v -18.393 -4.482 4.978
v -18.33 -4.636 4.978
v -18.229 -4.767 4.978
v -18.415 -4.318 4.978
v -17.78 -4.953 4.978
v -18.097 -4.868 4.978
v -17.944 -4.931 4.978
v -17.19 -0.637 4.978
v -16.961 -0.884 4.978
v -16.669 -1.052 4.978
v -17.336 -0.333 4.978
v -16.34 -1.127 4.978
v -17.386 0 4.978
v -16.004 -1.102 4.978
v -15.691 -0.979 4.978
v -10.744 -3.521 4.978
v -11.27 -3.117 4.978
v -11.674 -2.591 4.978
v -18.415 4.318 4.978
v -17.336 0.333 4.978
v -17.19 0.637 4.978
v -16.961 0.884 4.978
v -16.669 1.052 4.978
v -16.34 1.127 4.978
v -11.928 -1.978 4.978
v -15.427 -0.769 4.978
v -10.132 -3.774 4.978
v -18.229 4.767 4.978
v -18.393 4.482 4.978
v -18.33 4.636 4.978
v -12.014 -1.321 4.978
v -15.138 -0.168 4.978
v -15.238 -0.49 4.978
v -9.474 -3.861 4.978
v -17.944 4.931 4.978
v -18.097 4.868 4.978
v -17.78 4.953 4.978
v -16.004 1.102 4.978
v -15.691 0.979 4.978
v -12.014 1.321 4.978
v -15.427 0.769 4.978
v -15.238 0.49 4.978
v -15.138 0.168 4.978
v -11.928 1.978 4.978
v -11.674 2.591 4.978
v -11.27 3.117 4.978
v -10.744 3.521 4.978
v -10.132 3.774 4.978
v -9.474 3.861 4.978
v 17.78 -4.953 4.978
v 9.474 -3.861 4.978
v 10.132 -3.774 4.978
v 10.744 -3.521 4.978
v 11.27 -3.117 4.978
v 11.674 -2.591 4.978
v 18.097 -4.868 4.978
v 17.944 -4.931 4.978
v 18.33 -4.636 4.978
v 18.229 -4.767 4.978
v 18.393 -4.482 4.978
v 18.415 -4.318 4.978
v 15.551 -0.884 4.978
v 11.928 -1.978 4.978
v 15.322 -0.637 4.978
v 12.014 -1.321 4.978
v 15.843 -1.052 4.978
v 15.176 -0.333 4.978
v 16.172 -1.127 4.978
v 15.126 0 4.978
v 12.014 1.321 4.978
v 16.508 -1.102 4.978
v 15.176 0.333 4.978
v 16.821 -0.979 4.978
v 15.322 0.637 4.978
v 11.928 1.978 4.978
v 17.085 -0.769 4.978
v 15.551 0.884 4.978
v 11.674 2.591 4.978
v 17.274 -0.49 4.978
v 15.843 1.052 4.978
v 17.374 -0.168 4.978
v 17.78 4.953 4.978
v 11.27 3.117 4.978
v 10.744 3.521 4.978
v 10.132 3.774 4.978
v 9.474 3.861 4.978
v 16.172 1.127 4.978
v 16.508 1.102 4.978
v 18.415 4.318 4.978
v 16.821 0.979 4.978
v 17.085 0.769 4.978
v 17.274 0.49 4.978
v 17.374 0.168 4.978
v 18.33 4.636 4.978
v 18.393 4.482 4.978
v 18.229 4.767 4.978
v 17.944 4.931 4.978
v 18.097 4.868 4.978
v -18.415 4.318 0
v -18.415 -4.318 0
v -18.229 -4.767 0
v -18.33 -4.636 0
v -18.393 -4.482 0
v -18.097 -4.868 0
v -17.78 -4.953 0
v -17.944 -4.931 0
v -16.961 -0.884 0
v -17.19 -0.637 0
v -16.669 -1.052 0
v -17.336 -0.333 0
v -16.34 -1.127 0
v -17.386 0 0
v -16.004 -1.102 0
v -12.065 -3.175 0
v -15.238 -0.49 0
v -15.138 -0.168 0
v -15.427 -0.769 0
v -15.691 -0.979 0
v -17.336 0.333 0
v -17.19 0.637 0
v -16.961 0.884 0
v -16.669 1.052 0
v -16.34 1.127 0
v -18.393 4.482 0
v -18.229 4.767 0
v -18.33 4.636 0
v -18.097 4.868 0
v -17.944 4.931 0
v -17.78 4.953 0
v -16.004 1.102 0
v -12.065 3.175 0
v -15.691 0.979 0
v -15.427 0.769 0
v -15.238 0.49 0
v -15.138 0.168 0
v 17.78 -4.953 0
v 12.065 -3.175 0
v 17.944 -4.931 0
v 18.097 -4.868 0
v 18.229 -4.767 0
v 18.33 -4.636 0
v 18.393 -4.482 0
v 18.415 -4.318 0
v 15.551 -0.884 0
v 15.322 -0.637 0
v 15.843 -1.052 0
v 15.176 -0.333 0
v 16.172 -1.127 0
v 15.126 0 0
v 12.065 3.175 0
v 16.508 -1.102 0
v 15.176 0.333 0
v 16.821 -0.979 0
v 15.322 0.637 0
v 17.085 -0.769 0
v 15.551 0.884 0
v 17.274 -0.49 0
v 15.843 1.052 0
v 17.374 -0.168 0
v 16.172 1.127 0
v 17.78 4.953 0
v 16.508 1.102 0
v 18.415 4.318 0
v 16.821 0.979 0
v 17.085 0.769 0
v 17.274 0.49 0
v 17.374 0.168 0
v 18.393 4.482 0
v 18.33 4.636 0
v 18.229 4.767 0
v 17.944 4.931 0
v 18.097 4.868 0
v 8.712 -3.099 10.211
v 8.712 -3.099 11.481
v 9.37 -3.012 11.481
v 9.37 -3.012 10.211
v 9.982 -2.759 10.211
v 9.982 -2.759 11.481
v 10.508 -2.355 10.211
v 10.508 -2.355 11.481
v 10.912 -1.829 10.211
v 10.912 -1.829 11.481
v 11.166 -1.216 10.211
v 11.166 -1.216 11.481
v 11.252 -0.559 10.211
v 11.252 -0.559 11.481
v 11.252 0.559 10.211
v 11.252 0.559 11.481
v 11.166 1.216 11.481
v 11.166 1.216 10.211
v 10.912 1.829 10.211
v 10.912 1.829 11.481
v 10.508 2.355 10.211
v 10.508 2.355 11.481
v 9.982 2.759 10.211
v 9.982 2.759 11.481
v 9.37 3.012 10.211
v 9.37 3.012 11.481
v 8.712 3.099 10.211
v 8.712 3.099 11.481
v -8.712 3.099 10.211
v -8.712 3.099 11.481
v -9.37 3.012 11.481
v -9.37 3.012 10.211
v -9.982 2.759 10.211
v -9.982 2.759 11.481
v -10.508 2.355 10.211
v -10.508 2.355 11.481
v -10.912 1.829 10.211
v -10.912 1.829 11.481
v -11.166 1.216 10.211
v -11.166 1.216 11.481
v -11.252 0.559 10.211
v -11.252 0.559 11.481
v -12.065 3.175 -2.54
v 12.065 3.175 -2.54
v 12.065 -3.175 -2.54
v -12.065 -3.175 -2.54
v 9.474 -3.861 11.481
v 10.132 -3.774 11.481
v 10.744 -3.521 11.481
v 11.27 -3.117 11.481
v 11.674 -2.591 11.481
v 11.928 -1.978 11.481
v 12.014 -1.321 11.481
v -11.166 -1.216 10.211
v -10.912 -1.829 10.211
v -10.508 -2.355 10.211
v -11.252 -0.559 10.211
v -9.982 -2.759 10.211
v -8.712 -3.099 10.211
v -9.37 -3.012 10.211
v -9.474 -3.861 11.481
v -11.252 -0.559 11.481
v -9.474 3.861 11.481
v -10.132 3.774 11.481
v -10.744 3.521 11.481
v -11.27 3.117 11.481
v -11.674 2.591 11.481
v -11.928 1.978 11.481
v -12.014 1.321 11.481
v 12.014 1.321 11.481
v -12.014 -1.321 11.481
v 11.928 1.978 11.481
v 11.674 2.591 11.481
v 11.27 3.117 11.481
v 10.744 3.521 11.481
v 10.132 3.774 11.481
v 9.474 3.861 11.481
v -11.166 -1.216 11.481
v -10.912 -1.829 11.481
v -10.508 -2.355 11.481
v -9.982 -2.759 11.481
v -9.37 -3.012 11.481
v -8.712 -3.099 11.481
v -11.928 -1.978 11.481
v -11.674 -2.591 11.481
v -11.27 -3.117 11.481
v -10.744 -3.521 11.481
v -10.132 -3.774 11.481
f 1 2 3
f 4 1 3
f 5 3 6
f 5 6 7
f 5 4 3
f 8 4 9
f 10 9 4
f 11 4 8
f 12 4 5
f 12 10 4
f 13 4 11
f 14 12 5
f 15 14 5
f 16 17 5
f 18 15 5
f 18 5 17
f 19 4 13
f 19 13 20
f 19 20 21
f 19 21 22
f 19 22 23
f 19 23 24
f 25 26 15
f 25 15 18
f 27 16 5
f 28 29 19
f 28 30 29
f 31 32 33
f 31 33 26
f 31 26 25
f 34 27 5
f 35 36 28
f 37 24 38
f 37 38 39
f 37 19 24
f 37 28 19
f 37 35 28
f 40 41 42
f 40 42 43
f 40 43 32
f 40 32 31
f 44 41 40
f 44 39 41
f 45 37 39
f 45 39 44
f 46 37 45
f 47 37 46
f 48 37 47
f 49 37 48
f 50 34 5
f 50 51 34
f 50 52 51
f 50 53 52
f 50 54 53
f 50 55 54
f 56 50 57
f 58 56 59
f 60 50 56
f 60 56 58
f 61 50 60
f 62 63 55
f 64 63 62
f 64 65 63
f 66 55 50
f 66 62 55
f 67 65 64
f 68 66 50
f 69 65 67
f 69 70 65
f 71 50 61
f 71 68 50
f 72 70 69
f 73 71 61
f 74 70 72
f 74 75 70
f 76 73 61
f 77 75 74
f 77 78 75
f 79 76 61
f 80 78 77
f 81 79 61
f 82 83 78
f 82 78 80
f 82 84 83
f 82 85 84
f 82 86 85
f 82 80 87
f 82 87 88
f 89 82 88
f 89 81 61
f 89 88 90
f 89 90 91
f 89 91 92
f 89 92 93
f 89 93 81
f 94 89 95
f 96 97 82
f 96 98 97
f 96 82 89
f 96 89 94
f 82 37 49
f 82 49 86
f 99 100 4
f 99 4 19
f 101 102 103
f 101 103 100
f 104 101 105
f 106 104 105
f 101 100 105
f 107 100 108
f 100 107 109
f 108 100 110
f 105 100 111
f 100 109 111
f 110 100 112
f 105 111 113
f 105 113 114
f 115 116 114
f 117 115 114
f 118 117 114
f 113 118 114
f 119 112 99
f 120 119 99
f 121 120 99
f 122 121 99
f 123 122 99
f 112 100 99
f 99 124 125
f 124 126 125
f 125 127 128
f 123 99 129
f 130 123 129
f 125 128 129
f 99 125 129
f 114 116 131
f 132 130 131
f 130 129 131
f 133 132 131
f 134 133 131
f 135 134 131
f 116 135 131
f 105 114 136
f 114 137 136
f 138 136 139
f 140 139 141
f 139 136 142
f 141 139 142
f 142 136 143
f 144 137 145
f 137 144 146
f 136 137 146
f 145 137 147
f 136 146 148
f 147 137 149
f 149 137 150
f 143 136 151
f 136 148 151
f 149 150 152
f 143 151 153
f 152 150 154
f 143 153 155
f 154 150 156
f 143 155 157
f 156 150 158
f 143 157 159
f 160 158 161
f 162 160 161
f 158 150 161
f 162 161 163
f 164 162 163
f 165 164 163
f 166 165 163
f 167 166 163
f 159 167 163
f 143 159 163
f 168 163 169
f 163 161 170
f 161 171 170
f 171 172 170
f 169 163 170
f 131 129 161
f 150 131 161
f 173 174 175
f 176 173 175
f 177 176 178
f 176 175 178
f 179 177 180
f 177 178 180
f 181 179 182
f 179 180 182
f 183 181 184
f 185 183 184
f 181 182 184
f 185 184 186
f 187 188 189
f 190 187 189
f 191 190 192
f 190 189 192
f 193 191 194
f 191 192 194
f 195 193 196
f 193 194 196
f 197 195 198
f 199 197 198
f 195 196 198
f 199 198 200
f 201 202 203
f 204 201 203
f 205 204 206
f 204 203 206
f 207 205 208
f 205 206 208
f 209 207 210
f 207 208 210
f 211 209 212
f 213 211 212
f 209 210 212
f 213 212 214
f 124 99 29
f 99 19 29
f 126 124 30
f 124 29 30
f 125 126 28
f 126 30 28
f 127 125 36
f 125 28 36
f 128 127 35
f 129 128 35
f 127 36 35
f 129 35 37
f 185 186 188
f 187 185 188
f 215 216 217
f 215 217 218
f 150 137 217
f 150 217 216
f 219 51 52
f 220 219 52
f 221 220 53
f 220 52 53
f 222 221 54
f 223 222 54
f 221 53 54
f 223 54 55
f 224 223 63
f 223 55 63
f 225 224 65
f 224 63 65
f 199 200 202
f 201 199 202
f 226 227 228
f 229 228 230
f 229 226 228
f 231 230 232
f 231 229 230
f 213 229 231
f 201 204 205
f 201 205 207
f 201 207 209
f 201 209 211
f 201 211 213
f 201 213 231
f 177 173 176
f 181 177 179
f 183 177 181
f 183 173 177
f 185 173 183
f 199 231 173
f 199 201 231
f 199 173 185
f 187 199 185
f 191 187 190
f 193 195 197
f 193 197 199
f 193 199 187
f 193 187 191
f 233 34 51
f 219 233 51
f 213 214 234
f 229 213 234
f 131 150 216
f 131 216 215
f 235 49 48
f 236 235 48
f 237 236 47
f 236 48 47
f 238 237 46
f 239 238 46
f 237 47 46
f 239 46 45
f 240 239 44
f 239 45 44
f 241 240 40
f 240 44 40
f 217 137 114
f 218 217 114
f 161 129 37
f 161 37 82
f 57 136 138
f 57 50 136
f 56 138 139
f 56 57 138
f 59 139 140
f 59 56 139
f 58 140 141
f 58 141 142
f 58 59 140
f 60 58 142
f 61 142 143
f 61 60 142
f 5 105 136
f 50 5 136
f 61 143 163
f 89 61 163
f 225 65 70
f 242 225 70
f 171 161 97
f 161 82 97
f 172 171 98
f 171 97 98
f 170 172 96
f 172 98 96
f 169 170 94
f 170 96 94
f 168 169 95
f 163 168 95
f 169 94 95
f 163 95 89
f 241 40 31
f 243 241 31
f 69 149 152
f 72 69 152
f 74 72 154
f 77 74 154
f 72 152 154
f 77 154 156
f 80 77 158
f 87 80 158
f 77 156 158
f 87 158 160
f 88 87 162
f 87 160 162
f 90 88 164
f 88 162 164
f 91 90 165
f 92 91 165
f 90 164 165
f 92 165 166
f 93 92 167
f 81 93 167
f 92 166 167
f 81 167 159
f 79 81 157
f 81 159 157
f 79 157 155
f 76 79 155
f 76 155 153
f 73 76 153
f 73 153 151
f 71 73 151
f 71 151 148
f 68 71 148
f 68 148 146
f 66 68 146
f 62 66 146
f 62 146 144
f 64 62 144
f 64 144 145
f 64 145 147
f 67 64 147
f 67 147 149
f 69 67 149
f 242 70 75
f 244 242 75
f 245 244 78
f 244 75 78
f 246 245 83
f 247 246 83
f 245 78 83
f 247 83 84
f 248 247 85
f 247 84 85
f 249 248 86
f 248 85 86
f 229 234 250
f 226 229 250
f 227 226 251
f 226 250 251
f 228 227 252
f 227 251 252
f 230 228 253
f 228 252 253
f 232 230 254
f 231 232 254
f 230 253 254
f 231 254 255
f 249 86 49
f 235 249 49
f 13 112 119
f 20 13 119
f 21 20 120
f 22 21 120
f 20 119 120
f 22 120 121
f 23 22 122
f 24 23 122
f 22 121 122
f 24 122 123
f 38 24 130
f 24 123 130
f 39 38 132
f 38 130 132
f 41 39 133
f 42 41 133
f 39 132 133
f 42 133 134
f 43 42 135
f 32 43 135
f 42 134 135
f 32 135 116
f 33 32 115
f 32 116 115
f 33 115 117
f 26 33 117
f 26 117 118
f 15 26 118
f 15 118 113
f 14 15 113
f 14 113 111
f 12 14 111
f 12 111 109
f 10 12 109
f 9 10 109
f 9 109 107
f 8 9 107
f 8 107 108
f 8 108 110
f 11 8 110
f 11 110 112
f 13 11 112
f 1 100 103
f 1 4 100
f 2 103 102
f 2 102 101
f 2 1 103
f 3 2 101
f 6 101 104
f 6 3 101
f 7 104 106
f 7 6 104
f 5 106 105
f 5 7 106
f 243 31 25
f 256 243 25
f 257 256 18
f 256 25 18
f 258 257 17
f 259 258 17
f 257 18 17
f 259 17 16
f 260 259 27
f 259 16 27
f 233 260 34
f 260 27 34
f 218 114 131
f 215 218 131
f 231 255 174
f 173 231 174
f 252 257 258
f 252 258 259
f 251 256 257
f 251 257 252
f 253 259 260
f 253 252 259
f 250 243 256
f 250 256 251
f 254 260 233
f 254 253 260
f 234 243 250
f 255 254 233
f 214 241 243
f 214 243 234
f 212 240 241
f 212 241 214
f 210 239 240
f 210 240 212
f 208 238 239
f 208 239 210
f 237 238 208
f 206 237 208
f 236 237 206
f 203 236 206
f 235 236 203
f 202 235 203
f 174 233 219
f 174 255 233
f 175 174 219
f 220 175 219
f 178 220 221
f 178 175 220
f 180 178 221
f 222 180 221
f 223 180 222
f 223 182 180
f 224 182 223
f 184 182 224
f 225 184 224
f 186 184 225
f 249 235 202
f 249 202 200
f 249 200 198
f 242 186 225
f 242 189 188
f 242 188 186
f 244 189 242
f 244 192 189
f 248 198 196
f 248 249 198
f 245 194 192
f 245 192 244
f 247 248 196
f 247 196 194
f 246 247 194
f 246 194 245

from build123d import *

# Parameters (mm, degrees)
SKETCH1_W                 = 36.83
SKETCH1_H                 = 9.906
BASE_DEPTH                = 4.9784
BOSS_EXTRUDE2_DEPTH       = 6.5024
F_4_40_TAPPED_HOLE1_D     = 2.2606
F_4_40_TAPPED_HOLE1_DEPTH = 7.5946
F_4_40_TAPPED_HOLE1_TIP   = 0.679152758
SKETCH5_W                 = 24.13
SKETCH5_H                 = 6.35
BOSS_EXTRUDE3_DEPTH       = 2.54
CUT_EXTRUDE1_DEPTH        = 1.27
FILLET1_R                 = 0.635


with BuildPart() as part:
    # Sketch1 → Base (new body)
    with BuildSketch(Plane.XY):
        Rectangle(SKETCH1_W, SKETCH1_H)
    extrude(amount=BASE_DEPTH)

    # Sketch2 → Boss-Extrude2 (add)
    with BuildSketch(Plane.XY.offset(4.9784)):
        with BuildLine():
            Line((-9.4742, -3.8608), (9.4742, -3.8608))
            ThreePointArc((9.4742, -3.8608), (11.270251224, -3.116851224), (12.0142, -1.3208))
            Line((12.0142, -1.3208), (12.0142, 1.3208))
            ThreePointArc((12.0142, 1.3208), (11.270251224, 3.116851224), (9.4742, 3.8608))
            Line((9.4742, 3.8608), (-9.4742, 3.8608))
            ThreePointArc((-9.4742, 3.8608), (-11.270251224, 3.116851224), (-12.0142, 1.3208))
            Line((-12.0142, 1.3208), (-12.0142, -1.3208))
            ThreePointArc((-12.0142, -1.3208), (-11.270251224, -3.116851224), (-9.4742, -3.8608))
        make_face()
    extrude(amount=BOSS_EXTRUDE2_DEPTH)

    # #4-40 Tapped Hole1
    with Locations(Plane.XY.offset(4.9784)):
        with Locations((-16.256, 0), (16.256, 0)):
            Hole(F_4_40_TAPPED_HOLE1_D / 2, depth=F_4_40_TAPPED_HOLE1_DEPTH)
            with Locations((0, 0, -(F_4_40_TAPPED_HOLE1_DEPTH + F_4_40_TAPPED_HOLE1_TIP / 2))):  # 118° drill point
                Cone(0, F_4_40_TAPPED_HOLE1_D / 2, F_4_40_TAPPED_HOLE1_TIP, mode=Mode.SUBTRACT)

    # Sketch5 → Boss-Extrude3 (add)
    with BuildSketch(Plane(origin=(0, 0, 0), x_dir=(-1, 0, 0), z_dir=(0, 0, -1))):
        Rectangle(SKETCH5_W, SKETCH5_H)
    extrude(amount=BOSS_EXTRUDE3_DEPTH)

    # Sketch6 → Cut-Extrude1 (cut)
    with BuildSketch(Plane.XY.offset(11.4808)):
        with BuildLine():
            Line((-8.7122, -3.0988), (8.7122, -3.0988))
            ThreePointArc((8.7122, -3.0988), (10.508251224, -2.354851224), (11.2522, -0.5588))
            Line((11.2522, -0.5588), (11.2522, 0.5588))
            ThreePointArc((11.2522, 0.5588), (10.508251224, 2.354851224), (8.7122, 3.0988))
            Line((8.7122, 3.0988), (-8.7122, 3.0988))
            ThreePointArc((-8.7122, 3.0988), (-10.508251224, 2.354851224), (-11.2522, 0.5588))
            Line((-11.2522, 0.5588), (-11.2522, -0.5588))
            ThreePointArc((-11.2522, -0.5588), (-10.508251224, -2.354851224), (-8.7122, -3.0988))
        make_face()
    extrude(amount=-CUT_EXTRUDE1_DEPTH, mode=Mode.SUBTRACT)

    # Fillet1
    fillet1_edges = [part.edges().sort_by_distance(p)[0] for p in [
        (18.415, -4.953, 2.4892),
        (-18.415, -4.953, 2.4892),
        (-18.415, 4.953, 2.4892),
        (18.415, 4.953, 2.4892),
    ]]
    fillet(fillet1_edges, radius=FILLET1_R)


solid = part.part
